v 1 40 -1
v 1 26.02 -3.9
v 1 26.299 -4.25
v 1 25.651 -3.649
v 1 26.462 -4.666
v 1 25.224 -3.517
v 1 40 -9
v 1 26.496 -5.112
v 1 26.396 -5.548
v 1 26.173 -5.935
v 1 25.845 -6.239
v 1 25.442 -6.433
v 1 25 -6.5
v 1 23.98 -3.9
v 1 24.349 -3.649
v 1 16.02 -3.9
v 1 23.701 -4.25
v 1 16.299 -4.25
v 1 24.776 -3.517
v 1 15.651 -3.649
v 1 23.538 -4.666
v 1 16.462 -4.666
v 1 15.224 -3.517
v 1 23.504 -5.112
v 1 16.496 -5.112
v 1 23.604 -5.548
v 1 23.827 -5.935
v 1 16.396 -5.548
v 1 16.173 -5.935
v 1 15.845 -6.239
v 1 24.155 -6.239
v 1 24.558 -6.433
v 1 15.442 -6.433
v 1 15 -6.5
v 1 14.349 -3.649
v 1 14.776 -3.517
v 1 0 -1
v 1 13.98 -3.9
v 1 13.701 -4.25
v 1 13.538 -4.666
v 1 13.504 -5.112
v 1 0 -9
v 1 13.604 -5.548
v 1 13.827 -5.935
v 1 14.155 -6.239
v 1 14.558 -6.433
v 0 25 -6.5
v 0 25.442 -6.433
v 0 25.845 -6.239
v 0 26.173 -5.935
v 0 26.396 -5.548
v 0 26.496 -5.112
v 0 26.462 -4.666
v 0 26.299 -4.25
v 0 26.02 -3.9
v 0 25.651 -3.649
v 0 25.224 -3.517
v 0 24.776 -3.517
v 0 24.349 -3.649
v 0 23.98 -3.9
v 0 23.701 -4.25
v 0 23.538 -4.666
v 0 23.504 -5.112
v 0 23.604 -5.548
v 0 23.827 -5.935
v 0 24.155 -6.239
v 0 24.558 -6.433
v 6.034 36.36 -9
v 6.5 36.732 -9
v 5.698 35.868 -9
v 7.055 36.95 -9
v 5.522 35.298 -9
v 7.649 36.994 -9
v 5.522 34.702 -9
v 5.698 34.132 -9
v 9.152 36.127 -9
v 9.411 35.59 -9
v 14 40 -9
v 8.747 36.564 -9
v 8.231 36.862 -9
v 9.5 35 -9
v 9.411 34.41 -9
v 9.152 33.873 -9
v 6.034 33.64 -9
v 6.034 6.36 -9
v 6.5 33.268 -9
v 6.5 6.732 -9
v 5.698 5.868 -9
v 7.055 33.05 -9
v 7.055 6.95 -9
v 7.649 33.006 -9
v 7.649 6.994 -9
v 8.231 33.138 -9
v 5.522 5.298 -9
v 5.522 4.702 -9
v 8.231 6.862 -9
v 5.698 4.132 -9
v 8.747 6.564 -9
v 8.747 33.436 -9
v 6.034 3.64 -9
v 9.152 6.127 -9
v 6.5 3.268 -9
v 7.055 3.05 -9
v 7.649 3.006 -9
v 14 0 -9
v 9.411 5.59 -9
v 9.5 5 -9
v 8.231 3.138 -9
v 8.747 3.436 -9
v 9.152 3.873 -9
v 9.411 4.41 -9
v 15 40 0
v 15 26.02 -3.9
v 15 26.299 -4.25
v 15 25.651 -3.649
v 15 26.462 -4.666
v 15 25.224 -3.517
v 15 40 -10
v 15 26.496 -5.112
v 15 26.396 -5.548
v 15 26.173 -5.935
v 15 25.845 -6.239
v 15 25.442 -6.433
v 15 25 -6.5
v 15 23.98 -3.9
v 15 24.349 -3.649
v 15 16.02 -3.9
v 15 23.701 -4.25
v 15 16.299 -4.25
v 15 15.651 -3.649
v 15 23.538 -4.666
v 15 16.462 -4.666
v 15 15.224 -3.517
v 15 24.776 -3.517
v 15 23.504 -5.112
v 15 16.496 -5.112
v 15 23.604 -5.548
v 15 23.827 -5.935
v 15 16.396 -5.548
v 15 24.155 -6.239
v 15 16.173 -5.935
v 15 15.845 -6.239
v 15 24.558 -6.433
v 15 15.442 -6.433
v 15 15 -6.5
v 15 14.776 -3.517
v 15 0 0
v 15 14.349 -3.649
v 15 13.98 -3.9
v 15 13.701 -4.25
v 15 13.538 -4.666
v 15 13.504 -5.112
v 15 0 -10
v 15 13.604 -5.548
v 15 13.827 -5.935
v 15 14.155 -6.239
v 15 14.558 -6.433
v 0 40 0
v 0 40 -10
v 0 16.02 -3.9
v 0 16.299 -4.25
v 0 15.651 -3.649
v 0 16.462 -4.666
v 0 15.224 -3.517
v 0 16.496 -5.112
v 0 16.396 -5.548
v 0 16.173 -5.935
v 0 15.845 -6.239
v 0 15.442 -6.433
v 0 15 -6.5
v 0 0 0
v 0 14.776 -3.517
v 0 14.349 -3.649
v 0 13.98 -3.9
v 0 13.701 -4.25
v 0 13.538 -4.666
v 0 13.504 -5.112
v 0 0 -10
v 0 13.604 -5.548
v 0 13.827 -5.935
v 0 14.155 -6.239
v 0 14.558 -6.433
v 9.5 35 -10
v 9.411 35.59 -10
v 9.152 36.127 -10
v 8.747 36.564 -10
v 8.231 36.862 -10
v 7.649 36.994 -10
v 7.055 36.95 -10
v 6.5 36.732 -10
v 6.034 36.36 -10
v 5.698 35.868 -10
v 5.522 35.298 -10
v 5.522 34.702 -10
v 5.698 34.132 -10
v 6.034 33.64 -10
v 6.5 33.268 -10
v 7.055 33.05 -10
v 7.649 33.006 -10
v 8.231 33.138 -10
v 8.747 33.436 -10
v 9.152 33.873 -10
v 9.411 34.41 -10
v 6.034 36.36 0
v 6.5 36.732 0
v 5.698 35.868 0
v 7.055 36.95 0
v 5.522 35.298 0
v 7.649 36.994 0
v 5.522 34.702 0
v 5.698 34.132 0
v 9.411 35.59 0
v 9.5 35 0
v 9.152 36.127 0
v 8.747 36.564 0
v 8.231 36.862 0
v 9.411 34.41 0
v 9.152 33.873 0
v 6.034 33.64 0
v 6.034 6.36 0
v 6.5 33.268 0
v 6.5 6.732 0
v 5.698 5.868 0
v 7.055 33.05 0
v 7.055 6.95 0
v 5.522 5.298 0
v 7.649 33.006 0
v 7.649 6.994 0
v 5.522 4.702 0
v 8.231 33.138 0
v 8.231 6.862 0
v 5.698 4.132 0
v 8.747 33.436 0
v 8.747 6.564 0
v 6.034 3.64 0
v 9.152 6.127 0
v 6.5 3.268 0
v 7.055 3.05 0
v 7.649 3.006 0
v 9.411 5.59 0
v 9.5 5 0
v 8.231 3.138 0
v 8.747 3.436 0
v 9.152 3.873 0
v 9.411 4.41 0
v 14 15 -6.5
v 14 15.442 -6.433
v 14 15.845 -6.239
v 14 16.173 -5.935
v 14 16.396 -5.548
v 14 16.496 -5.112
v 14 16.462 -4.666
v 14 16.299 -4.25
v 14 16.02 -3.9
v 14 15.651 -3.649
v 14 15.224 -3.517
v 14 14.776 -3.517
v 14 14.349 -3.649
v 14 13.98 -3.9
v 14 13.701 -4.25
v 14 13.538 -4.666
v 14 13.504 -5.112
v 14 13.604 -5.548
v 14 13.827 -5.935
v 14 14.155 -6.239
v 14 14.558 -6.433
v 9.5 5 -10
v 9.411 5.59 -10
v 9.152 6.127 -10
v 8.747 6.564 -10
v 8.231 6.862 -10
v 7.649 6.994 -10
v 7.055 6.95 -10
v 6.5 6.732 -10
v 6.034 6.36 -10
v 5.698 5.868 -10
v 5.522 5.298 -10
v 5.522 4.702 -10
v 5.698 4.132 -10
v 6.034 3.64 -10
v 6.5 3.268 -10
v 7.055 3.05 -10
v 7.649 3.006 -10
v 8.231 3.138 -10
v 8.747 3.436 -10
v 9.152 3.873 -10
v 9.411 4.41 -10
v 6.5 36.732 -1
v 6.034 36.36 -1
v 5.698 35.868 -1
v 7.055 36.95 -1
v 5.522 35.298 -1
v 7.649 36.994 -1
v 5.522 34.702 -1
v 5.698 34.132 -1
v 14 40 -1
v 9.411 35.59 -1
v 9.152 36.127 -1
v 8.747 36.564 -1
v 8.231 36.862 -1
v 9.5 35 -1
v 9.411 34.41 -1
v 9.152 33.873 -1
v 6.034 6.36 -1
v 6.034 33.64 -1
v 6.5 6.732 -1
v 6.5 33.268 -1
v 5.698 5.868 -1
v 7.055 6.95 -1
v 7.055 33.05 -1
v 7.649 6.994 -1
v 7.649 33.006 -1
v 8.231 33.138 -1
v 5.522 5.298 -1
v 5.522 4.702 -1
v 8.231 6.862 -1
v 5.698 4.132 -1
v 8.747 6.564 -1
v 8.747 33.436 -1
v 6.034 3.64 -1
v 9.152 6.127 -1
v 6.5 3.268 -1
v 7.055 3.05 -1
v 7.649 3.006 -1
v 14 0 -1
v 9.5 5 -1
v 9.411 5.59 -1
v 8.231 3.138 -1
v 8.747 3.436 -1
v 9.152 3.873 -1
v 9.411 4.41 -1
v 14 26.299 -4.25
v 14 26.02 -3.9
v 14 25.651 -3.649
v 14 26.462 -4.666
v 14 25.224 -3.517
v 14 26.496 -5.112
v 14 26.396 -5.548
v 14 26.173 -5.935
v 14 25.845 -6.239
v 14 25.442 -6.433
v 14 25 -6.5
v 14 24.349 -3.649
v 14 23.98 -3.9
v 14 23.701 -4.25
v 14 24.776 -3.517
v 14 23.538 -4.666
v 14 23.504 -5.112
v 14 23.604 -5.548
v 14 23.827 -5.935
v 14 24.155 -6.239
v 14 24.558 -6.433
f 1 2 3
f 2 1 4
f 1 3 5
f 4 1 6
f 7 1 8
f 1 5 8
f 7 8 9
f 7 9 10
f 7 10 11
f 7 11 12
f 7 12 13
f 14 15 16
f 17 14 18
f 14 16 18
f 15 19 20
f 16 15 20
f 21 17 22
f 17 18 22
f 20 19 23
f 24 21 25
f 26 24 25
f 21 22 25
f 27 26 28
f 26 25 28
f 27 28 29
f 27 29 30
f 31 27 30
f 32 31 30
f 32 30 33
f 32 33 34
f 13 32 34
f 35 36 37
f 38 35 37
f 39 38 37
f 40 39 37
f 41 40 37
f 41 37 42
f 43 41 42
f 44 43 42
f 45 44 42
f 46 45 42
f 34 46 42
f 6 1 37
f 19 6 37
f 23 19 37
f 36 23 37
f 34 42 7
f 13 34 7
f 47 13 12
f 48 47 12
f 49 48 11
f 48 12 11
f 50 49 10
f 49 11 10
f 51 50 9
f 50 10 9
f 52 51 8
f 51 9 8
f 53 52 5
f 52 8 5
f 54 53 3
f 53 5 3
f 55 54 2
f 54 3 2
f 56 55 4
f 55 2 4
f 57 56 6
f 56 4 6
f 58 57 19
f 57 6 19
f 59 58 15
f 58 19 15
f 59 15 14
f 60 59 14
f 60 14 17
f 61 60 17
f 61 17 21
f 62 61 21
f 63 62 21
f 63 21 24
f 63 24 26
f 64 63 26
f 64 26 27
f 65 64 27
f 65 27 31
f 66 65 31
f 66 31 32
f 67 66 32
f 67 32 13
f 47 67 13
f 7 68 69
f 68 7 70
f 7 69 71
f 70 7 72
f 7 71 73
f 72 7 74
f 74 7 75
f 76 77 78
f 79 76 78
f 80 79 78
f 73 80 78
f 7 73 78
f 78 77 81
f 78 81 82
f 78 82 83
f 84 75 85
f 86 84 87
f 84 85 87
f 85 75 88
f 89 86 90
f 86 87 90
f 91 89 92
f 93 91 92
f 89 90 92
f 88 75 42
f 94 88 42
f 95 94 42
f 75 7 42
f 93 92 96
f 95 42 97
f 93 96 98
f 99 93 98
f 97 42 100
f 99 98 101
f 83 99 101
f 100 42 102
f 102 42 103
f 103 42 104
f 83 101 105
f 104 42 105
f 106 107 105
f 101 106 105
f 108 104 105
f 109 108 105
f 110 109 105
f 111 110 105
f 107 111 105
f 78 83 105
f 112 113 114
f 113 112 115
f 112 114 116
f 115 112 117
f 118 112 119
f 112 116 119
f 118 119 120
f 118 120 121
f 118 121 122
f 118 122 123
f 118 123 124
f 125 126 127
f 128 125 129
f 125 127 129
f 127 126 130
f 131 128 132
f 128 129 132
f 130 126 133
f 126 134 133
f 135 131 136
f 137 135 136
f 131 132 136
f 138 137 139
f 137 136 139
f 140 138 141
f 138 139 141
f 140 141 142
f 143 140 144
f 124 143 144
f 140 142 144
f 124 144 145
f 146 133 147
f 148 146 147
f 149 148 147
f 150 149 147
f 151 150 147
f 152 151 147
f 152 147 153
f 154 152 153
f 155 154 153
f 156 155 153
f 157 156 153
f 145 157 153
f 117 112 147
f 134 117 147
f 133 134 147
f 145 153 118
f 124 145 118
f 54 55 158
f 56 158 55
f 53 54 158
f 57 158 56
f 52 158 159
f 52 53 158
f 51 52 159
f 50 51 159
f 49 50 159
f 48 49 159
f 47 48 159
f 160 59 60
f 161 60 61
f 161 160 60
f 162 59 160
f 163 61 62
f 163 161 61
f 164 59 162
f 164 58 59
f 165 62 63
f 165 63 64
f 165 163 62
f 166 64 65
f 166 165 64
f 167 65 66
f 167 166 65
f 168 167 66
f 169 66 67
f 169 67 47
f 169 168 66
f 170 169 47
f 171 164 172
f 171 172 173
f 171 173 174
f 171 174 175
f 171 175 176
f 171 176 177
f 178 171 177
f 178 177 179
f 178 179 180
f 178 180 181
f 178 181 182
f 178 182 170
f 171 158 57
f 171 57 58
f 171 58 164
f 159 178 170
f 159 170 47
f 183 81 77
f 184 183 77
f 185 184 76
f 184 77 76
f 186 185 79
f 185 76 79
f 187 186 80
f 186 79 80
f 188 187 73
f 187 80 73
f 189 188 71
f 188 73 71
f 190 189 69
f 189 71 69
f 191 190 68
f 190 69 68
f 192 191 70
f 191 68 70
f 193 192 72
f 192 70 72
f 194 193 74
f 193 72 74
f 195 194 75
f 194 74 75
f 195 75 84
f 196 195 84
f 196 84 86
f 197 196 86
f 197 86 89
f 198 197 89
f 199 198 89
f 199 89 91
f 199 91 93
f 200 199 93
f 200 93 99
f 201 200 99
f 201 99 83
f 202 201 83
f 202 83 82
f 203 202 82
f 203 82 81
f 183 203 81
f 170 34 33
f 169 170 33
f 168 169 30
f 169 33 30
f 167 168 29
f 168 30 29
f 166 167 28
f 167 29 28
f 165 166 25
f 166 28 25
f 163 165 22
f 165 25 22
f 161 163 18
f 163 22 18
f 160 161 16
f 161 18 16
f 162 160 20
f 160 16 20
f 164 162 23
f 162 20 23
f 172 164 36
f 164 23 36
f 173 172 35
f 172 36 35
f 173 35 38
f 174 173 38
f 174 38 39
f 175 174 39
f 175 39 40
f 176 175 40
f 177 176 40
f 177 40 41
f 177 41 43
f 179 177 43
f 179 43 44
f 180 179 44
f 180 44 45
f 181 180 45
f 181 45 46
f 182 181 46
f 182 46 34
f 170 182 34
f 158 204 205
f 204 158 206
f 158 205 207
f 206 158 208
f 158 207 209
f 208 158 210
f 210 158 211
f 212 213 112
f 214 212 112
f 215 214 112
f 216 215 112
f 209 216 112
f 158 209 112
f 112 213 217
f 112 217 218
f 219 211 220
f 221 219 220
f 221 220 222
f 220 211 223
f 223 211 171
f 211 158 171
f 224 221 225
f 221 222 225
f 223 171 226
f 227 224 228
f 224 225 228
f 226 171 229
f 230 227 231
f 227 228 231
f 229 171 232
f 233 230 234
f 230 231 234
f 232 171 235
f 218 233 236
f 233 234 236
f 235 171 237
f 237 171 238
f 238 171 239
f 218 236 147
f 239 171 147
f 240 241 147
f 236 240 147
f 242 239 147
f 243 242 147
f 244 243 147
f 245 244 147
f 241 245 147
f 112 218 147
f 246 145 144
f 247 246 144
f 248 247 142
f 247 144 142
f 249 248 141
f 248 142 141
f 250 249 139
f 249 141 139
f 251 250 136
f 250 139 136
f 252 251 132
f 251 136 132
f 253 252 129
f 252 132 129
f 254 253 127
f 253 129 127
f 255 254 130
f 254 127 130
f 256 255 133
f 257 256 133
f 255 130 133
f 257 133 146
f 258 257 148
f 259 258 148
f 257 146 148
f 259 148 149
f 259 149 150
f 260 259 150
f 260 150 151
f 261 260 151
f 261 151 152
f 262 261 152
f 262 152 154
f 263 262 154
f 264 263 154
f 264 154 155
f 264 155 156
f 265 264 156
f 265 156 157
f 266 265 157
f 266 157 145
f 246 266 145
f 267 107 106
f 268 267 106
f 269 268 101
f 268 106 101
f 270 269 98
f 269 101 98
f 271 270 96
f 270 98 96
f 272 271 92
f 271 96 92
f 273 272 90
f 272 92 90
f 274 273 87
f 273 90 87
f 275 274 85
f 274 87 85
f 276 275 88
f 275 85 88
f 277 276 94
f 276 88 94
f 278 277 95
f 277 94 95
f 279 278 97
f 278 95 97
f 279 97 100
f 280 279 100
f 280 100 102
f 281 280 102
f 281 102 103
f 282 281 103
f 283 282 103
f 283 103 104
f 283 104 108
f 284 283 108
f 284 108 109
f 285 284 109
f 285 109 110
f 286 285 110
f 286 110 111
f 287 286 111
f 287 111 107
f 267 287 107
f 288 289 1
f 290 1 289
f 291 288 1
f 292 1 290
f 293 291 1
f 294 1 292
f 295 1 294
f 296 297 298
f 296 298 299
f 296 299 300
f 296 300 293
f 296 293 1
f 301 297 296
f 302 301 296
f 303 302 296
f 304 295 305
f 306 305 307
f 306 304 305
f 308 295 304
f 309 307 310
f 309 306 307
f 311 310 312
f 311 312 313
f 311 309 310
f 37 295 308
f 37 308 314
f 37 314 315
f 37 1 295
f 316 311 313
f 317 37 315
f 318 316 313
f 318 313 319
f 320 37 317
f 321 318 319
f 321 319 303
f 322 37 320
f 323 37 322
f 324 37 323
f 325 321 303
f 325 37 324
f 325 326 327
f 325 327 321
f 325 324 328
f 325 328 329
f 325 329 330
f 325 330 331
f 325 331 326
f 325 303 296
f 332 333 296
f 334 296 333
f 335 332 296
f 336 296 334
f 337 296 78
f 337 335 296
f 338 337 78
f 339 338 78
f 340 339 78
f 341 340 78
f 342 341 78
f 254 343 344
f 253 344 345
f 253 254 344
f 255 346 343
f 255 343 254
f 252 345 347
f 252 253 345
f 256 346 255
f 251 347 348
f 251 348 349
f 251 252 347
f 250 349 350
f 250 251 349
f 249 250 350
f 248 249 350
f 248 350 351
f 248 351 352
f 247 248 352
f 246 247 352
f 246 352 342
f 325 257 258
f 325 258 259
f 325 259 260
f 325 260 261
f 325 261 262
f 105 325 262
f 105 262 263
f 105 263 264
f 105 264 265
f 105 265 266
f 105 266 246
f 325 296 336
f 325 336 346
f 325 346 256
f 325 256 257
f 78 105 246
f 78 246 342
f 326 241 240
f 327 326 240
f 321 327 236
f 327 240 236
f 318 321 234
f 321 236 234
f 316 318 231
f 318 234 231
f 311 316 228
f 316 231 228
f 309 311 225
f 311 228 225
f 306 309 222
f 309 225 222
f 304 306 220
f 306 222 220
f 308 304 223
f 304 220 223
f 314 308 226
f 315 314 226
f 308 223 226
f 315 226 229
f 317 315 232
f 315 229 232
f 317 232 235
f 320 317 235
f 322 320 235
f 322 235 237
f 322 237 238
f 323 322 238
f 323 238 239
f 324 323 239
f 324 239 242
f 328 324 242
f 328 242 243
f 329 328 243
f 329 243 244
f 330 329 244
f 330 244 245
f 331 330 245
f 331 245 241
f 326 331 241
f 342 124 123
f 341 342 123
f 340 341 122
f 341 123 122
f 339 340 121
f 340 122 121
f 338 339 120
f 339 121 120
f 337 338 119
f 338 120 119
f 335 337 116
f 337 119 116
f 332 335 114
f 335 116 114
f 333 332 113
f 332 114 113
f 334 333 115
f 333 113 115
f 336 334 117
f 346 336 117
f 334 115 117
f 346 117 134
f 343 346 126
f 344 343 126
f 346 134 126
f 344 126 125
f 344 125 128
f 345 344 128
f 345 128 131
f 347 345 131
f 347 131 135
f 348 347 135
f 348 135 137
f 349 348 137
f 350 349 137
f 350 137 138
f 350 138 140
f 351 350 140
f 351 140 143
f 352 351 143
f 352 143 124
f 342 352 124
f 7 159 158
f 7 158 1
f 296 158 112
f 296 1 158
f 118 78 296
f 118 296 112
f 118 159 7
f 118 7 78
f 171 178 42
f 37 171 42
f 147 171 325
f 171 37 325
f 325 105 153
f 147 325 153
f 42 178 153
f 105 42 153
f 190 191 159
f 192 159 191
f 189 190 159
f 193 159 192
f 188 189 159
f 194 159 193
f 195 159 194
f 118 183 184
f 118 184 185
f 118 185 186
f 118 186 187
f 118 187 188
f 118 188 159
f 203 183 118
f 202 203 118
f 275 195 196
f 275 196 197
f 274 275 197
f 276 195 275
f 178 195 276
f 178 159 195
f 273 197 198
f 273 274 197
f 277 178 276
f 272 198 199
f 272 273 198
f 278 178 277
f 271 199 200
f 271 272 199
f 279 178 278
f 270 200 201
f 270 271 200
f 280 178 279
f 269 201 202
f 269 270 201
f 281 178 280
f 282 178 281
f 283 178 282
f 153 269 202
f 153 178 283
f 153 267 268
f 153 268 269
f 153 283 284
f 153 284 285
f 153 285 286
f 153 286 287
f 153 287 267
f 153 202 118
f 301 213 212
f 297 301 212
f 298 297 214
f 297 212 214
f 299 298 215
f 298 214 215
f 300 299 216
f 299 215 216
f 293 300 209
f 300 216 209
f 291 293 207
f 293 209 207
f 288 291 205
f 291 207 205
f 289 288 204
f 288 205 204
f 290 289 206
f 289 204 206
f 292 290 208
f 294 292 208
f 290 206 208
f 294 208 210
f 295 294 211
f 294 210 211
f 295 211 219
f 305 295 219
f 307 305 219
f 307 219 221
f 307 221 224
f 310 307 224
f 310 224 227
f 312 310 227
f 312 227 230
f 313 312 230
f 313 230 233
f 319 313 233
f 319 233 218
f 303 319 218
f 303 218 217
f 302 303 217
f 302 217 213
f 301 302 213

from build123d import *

# Parameters (mm, degrees)
SKETCH_1_W          = 15
SKETCH_1_H          = 10
SKETCH_1_W_2        = 13
SKETCH_1_H_2        = 8
EXTRUDE_1_DEPTH     = 40
CUT_EXTRUDE_1_REACH = 45.875
SKETCH_3_R          = 1.5
CUT_EXTRUDE_2_REACH = 45.875
SKETCH_4_R          = 2


with BuildPart() as part:
    # ｽｹｯﾁ1 → 押し出し-薄板1 (new body)
    with BuildSketch(Plane(origin=(0, 0, 0), x_dir=(1, 0, 0), z_dir=(0, 1, 0))):
        with Locations((7.5, 5)):
            Rectangle(SKETCH_1_W, SKETCH_1_H)
        with Locations((7.5, 5)):
            Rectangle(SKETCH_1_W_2, SKETCH_1_H_2, mode=Mode.SUBTRACT)
    extrude(amount=EXTRUDE_1_DEPTH)

    # ｶｯﾄ - 押し出し1: up to this face of the body (flat: up to its plane)
    cut_extrude_1_end = Plane(part.part.faces().sort_by_distance((0, 20, -5))[0])
    # ｽｹｯﾁ3 → ｶｯﾄ - 押し出し1 (cut, up to the picked face)
    with BuildSketch(Plane(origin=(15, 0, 0), x_dir=(0, 0, -1), z_dir=(1, 0, 0)), mode=Mode.PRIVATE) as cut_extrude_1_sk1:
        with Locations((5, 25)):
            Circle(SKETCH_3_R)
    cut_extrude_1_tool1 = split(extrude(cut_extrude_1_sk1.sketch, amount=-CUT_EXTRUDE_1_REACH, mode=Mode.PRIVATE), bisect_by=cut_extrude_1_end, keep=Keep.BOTH, mode=Mode.PRIVATE)
    # ｽｹｯﾁ3 → ｶｯﾄ - 押し出し1 (cut, up to the picked face)
    with BuildSketch(Plane(origin=(15, 0, 0), x_dir=(0, 0, -1), z_dir=(1, 0, 0)), mode=Mode.PRIVATE) as cut_extrude_1_sk2:
        with Locations((5, 15)):
            Circle(SKETCH_3_R)
    cut_extrude_1_tool2 = split(extrude(cut_extrude_1_sk2.sketch, amount=-CUT_EXTRUDE_1_REACH, mode=Mode.PRIVATE), bisect_by=cut_extrude_1_end, keep=Keep.BOTH, mode=Mode.PRIVATE)
    add(cut_extrude_1_tool1.solids().sort_by(Axis((15, 25, -5), (-1, 0, 0)))[0], mode=Mode.SUBTRACT)
    add(cut_extrude_1_tool2.solids().sort_by(Axis((15, 15, -5), (-1, 0, 0)))[0], mode=Mode.SUBTRACT)

    # ｶｯﾄ - 押し出し2: up to this face of the body (flat: up to its plane)
    cut_extrude_2_end = Plane(part.part.faces().sort_by_distance((7.5, 20, -10))[0])
    # ｽｹｯﾁ4 → ｶｯﾄ - 押し出し2 (cut, up to the picked face)
    with BuildSketch(Plane.XY, mode=Mode.PRIVATE) as cut_extrude_2_sk1:
        with Locations((7.5, 35)):
            Circle(SKETCH_4_R)
    cut_extrude_2_tool1 = split(extrude(cut_extrude_2_sk1.sketch, amount=-CUT_EXTRUDE_2_REACH, mode=Mode.PRIVATE), bisect_by=cut_extrude_2_end, keep=Keep.BOTH, mode=Mode.PRIVATE)
    # ｽｹｯﾁ4 → ｶｯﾄ - 押し出し2 (cut, up to the picked face)
    with BuildSketch(Plane.XY, mode=Mode.PRIVATE) as cut_extrude_2_sk2:
        with Locations((7.5, 5)):
            Circle(SKETCH_4_R)
    cut_extrude_2_tool2 = split(extrude(cut_extrude_2_sk2.sketch, amount=-CUT_EXTRUDE_2_REACH, mode=Mode.PRIVATE), bisect_by=cut_extrude_2_end, keep=Keep.BOTH, mode=Mode.PRIVATE)
    add(cut_extrude_2_tool1.solids().sort_by(Axis((7.5, 35, 0), (0, 0, -1)))[0], mode=Mode.SUBTRACT)
    add(cut_extrude_2_tool2.solids().sort_by(Axis((7.5, 5, 0), (0, 0, -1)))[0], mode=Mode.SUBTRACT)


solid = part.part
